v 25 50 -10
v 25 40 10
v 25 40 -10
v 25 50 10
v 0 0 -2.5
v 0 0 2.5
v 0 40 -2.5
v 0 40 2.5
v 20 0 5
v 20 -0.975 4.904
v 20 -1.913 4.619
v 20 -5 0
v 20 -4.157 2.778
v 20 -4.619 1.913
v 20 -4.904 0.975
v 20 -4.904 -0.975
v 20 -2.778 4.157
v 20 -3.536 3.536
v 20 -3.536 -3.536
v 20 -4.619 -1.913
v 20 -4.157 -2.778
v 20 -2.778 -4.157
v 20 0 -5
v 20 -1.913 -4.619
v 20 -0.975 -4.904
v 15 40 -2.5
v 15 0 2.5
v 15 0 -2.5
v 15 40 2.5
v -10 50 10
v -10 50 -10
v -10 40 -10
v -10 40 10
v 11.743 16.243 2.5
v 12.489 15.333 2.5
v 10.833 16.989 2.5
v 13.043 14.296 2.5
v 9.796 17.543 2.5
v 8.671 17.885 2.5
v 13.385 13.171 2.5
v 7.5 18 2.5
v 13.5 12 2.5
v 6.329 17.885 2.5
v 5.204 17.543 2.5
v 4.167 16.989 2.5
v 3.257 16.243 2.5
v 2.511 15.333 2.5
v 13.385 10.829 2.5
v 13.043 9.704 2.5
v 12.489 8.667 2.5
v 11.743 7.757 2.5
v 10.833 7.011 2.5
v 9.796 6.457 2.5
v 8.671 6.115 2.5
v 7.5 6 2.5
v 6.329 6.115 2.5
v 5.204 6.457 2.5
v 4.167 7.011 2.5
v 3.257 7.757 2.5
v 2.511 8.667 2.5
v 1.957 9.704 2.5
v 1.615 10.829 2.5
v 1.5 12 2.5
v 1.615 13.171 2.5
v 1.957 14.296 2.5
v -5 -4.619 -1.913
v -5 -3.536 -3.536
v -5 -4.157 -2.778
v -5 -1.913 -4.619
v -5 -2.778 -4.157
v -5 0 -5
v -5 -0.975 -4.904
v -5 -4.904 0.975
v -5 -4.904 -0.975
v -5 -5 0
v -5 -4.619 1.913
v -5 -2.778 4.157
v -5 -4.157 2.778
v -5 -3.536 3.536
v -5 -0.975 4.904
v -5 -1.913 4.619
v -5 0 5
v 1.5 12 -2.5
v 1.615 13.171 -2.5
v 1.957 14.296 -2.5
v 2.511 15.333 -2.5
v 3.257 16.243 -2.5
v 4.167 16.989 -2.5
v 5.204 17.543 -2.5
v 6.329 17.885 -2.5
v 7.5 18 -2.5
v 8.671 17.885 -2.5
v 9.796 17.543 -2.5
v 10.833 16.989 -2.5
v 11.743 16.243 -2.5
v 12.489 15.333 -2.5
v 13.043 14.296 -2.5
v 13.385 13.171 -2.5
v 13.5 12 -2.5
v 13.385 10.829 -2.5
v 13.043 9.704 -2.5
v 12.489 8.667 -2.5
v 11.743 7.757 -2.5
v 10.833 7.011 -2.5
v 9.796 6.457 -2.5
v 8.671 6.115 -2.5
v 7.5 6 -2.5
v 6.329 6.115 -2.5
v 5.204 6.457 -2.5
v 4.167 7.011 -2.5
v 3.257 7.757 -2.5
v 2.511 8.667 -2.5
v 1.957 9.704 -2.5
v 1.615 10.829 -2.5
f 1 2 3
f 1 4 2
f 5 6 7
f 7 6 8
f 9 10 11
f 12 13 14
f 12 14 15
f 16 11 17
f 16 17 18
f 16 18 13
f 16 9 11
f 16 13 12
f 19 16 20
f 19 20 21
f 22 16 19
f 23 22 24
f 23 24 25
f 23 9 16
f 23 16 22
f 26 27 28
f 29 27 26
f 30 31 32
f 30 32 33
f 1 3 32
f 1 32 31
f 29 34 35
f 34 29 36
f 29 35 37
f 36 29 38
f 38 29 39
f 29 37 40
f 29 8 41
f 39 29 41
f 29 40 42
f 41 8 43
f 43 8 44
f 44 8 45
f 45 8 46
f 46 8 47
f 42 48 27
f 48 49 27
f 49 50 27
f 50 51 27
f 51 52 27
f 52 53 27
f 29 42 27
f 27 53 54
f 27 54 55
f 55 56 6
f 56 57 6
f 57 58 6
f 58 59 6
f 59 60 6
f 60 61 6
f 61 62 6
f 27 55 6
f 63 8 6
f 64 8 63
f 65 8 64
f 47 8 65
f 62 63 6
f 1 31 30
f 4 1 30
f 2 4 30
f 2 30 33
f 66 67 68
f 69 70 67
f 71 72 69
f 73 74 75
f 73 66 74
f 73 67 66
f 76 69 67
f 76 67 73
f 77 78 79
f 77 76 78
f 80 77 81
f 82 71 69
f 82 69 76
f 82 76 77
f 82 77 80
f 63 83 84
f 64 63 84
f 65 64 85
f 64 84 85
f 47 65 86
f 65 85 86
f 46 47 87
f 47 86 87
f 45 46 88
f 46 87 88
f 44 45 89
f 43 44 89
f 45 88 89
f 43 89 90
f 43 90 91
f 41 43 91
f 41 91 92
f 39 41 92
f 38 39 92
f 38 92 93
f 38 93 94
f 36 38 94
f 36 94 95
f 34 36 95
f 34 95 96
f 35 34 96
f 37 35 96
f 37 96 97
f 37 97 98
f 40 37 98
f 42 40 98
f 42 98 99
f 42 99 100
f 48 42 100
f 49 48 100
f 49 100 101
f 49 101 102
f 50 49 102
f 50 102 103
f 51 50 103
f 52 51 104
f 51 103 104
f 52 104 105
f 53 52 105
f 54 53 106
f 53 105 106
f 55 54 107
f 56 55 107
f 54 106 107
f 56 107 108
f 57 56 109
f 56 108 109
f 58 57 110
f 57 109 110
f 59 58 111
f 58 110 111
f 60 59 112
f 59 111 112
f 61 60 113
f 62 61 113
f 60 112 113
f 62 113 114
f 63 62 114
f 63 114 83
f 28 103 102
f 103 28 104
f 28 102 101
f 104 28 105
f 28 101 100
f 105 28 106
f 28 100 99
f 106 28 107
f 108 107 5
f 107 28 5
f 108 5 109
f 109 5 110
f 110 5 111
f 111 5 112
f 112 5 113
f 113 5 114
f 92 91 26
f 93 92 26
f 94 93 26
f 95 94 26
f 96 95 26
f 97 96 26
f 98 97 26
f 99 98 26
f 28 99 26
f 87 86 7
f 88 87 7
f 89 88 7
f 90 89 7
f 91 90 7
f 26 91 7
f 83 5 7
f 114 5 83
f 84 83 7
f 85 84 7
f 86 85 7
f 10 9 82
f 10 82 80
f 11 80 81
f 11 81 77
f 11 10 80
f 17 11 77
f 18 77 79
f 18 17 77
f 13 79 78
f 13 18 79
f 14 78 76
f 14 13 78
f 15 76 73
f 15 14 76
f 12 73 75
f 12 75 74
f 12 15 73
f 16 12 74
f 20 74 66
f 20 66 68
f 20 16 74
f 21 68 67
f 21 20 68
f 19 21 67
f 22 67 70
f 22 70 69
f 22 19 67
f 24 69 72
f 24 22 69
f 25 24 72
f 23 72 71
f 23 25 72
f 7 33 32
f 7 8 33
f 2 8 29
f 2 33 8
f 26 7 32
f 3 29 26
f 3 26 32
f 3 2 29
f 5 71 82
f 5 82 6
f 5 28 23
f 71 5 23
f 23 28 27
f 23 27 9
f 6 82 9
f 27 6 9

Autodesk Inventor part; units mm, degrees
ref_plane "YZ Plane" through (0, 0, 0) normal (1, 0, 0) x (0, 1, 0)
ref_plane "XZ Plane" through (0, 0, 0) normal (0, 1, 0) x (-1, 0, 0)
ref_plane "XY Plane" through (0, 0, 0) normal (0, 0, 1) x (1, 0, 0)
sketch "Sketch1" plane through (0, 0, 0) normal (1, 0, 0) x (0, 1, 0)
  line L0 (50, 10) -> (40, 10)
  line L1 (40, 10) -> (40, -10)
  line L2 (40, -10) -> (50, -10)
  line L3 (50, -10) -> (50, 10)
  line L4 (40, 2.5) -> (0, 2.5)
  line L5 (0, 2.5) -> (0, -2.5)
  line L6 (0, -2.5) -> (40, -2.5)
  line L7 (40, -2.5) -> (40, 2.5)
  point P0 (0, 0)
  dimension "d0" = 40
  dimension "d1" = 10
  dimension "d2" = 5
  dimension "d3" = 2.5
  dimension "d4" = 20
  dimension "d5" = 10
extrude "Extrusion1" add sketch "Sketch1" along normal blind 15
sketch "Sketch2" plane through (15, 0, 0) normal (1, 0, 0) x (0, 0, -1)
  line L0 (-10, 50) -> (-10, 40) projected
  line L1 (2.5, 40) -> (10, 40) projected
  line L2 (-10, 50) -> (10, 50)
  line L3 (10, 50) -> (10, 40)
  line L4 (10, 40) -> (-10, 40)
  line L5 (-10, 40) -> (-10, 50)
  point P0 (0, 0)
extrude "Extrusion2" add sketch "Sketch2" along normal blind 10
sketch "Sketch3" plane through (0, 0, 0) normal (-1, 0, 0) x (0, 0, 1)
  line L0 (-10, 40) -> (-10, 50) projected
  line L1 (10, 50) -> (10, 40) projected
  line L2 (-10, 50) -> (10, 50)
  line L3 (10, 50) -> (10, 40)
  line L4 (10, 40) -> (-10, 40)
  line L5 (-10, 40) -> (-10, 50)
  point P0 (0, 0)
extrude "Extrusion3" add sketch "Sketch3" along normal blind 10
sketch "Sketch4" plane through (0, 0, -2.5) normal (0, 0, -1) x (-1, 0, 0)
  circle A0 centre (-7.5, 12) radius 6
  point P0 (0, 0)
  dimension "d12" = 12
extrude "Extrusion4" cut sketch "Sketch4" against normal blind 5
sketch "Sketch5" plane through (0, 0, -2.5) normal (0, -1, 0) x (1, 0, 0)
  line L0 (-5, 7.5) -> (20, 7.5)
  line L1 (20, 7.5) -> (20, -2.5)
  line L2 (20, -2.5) -> (-5, -2.5)
  line L3 (-5, -2.5) -> (-5, 7.5)
  point P0 (0, 2.5)
  dimension "d15" = 25
  dimension "d16" = 10
extrude "Extrusion5" add sketch "Sketch5" along normal blind 10
sketch "Sketch6" plane through (20, 0, 5) normal (1, 0, 0) x (0, 0, -1)
  line L0 (0, 0) -> (10, 0) projected
  arc A0 (0, 0) -> (10, 0) centre (5, 0) ccw
  line L1 (0, 0) -> (0, -10) projected
  line L2 (0, 0) -> (0, -10)
  line L3 (10, -10) -> (0, -10) projected
  line L4 (0, -10) -> (10, -10)
  line L5 (10, 0) -> (10, -10) projected
  line L6 (10, -10) -> (10, 0)
  point P0 (5, 0)
  dimension "d19" = 5
extrude "Extrusion6" cut sketch "Sketch6" against normal blind 25 contours A0 L5 L3 L1
equation "\"d3\" = 0.5 * d2"
equation "\"d5\" = 0.5 * d4"
properties part number "Example Follower"
